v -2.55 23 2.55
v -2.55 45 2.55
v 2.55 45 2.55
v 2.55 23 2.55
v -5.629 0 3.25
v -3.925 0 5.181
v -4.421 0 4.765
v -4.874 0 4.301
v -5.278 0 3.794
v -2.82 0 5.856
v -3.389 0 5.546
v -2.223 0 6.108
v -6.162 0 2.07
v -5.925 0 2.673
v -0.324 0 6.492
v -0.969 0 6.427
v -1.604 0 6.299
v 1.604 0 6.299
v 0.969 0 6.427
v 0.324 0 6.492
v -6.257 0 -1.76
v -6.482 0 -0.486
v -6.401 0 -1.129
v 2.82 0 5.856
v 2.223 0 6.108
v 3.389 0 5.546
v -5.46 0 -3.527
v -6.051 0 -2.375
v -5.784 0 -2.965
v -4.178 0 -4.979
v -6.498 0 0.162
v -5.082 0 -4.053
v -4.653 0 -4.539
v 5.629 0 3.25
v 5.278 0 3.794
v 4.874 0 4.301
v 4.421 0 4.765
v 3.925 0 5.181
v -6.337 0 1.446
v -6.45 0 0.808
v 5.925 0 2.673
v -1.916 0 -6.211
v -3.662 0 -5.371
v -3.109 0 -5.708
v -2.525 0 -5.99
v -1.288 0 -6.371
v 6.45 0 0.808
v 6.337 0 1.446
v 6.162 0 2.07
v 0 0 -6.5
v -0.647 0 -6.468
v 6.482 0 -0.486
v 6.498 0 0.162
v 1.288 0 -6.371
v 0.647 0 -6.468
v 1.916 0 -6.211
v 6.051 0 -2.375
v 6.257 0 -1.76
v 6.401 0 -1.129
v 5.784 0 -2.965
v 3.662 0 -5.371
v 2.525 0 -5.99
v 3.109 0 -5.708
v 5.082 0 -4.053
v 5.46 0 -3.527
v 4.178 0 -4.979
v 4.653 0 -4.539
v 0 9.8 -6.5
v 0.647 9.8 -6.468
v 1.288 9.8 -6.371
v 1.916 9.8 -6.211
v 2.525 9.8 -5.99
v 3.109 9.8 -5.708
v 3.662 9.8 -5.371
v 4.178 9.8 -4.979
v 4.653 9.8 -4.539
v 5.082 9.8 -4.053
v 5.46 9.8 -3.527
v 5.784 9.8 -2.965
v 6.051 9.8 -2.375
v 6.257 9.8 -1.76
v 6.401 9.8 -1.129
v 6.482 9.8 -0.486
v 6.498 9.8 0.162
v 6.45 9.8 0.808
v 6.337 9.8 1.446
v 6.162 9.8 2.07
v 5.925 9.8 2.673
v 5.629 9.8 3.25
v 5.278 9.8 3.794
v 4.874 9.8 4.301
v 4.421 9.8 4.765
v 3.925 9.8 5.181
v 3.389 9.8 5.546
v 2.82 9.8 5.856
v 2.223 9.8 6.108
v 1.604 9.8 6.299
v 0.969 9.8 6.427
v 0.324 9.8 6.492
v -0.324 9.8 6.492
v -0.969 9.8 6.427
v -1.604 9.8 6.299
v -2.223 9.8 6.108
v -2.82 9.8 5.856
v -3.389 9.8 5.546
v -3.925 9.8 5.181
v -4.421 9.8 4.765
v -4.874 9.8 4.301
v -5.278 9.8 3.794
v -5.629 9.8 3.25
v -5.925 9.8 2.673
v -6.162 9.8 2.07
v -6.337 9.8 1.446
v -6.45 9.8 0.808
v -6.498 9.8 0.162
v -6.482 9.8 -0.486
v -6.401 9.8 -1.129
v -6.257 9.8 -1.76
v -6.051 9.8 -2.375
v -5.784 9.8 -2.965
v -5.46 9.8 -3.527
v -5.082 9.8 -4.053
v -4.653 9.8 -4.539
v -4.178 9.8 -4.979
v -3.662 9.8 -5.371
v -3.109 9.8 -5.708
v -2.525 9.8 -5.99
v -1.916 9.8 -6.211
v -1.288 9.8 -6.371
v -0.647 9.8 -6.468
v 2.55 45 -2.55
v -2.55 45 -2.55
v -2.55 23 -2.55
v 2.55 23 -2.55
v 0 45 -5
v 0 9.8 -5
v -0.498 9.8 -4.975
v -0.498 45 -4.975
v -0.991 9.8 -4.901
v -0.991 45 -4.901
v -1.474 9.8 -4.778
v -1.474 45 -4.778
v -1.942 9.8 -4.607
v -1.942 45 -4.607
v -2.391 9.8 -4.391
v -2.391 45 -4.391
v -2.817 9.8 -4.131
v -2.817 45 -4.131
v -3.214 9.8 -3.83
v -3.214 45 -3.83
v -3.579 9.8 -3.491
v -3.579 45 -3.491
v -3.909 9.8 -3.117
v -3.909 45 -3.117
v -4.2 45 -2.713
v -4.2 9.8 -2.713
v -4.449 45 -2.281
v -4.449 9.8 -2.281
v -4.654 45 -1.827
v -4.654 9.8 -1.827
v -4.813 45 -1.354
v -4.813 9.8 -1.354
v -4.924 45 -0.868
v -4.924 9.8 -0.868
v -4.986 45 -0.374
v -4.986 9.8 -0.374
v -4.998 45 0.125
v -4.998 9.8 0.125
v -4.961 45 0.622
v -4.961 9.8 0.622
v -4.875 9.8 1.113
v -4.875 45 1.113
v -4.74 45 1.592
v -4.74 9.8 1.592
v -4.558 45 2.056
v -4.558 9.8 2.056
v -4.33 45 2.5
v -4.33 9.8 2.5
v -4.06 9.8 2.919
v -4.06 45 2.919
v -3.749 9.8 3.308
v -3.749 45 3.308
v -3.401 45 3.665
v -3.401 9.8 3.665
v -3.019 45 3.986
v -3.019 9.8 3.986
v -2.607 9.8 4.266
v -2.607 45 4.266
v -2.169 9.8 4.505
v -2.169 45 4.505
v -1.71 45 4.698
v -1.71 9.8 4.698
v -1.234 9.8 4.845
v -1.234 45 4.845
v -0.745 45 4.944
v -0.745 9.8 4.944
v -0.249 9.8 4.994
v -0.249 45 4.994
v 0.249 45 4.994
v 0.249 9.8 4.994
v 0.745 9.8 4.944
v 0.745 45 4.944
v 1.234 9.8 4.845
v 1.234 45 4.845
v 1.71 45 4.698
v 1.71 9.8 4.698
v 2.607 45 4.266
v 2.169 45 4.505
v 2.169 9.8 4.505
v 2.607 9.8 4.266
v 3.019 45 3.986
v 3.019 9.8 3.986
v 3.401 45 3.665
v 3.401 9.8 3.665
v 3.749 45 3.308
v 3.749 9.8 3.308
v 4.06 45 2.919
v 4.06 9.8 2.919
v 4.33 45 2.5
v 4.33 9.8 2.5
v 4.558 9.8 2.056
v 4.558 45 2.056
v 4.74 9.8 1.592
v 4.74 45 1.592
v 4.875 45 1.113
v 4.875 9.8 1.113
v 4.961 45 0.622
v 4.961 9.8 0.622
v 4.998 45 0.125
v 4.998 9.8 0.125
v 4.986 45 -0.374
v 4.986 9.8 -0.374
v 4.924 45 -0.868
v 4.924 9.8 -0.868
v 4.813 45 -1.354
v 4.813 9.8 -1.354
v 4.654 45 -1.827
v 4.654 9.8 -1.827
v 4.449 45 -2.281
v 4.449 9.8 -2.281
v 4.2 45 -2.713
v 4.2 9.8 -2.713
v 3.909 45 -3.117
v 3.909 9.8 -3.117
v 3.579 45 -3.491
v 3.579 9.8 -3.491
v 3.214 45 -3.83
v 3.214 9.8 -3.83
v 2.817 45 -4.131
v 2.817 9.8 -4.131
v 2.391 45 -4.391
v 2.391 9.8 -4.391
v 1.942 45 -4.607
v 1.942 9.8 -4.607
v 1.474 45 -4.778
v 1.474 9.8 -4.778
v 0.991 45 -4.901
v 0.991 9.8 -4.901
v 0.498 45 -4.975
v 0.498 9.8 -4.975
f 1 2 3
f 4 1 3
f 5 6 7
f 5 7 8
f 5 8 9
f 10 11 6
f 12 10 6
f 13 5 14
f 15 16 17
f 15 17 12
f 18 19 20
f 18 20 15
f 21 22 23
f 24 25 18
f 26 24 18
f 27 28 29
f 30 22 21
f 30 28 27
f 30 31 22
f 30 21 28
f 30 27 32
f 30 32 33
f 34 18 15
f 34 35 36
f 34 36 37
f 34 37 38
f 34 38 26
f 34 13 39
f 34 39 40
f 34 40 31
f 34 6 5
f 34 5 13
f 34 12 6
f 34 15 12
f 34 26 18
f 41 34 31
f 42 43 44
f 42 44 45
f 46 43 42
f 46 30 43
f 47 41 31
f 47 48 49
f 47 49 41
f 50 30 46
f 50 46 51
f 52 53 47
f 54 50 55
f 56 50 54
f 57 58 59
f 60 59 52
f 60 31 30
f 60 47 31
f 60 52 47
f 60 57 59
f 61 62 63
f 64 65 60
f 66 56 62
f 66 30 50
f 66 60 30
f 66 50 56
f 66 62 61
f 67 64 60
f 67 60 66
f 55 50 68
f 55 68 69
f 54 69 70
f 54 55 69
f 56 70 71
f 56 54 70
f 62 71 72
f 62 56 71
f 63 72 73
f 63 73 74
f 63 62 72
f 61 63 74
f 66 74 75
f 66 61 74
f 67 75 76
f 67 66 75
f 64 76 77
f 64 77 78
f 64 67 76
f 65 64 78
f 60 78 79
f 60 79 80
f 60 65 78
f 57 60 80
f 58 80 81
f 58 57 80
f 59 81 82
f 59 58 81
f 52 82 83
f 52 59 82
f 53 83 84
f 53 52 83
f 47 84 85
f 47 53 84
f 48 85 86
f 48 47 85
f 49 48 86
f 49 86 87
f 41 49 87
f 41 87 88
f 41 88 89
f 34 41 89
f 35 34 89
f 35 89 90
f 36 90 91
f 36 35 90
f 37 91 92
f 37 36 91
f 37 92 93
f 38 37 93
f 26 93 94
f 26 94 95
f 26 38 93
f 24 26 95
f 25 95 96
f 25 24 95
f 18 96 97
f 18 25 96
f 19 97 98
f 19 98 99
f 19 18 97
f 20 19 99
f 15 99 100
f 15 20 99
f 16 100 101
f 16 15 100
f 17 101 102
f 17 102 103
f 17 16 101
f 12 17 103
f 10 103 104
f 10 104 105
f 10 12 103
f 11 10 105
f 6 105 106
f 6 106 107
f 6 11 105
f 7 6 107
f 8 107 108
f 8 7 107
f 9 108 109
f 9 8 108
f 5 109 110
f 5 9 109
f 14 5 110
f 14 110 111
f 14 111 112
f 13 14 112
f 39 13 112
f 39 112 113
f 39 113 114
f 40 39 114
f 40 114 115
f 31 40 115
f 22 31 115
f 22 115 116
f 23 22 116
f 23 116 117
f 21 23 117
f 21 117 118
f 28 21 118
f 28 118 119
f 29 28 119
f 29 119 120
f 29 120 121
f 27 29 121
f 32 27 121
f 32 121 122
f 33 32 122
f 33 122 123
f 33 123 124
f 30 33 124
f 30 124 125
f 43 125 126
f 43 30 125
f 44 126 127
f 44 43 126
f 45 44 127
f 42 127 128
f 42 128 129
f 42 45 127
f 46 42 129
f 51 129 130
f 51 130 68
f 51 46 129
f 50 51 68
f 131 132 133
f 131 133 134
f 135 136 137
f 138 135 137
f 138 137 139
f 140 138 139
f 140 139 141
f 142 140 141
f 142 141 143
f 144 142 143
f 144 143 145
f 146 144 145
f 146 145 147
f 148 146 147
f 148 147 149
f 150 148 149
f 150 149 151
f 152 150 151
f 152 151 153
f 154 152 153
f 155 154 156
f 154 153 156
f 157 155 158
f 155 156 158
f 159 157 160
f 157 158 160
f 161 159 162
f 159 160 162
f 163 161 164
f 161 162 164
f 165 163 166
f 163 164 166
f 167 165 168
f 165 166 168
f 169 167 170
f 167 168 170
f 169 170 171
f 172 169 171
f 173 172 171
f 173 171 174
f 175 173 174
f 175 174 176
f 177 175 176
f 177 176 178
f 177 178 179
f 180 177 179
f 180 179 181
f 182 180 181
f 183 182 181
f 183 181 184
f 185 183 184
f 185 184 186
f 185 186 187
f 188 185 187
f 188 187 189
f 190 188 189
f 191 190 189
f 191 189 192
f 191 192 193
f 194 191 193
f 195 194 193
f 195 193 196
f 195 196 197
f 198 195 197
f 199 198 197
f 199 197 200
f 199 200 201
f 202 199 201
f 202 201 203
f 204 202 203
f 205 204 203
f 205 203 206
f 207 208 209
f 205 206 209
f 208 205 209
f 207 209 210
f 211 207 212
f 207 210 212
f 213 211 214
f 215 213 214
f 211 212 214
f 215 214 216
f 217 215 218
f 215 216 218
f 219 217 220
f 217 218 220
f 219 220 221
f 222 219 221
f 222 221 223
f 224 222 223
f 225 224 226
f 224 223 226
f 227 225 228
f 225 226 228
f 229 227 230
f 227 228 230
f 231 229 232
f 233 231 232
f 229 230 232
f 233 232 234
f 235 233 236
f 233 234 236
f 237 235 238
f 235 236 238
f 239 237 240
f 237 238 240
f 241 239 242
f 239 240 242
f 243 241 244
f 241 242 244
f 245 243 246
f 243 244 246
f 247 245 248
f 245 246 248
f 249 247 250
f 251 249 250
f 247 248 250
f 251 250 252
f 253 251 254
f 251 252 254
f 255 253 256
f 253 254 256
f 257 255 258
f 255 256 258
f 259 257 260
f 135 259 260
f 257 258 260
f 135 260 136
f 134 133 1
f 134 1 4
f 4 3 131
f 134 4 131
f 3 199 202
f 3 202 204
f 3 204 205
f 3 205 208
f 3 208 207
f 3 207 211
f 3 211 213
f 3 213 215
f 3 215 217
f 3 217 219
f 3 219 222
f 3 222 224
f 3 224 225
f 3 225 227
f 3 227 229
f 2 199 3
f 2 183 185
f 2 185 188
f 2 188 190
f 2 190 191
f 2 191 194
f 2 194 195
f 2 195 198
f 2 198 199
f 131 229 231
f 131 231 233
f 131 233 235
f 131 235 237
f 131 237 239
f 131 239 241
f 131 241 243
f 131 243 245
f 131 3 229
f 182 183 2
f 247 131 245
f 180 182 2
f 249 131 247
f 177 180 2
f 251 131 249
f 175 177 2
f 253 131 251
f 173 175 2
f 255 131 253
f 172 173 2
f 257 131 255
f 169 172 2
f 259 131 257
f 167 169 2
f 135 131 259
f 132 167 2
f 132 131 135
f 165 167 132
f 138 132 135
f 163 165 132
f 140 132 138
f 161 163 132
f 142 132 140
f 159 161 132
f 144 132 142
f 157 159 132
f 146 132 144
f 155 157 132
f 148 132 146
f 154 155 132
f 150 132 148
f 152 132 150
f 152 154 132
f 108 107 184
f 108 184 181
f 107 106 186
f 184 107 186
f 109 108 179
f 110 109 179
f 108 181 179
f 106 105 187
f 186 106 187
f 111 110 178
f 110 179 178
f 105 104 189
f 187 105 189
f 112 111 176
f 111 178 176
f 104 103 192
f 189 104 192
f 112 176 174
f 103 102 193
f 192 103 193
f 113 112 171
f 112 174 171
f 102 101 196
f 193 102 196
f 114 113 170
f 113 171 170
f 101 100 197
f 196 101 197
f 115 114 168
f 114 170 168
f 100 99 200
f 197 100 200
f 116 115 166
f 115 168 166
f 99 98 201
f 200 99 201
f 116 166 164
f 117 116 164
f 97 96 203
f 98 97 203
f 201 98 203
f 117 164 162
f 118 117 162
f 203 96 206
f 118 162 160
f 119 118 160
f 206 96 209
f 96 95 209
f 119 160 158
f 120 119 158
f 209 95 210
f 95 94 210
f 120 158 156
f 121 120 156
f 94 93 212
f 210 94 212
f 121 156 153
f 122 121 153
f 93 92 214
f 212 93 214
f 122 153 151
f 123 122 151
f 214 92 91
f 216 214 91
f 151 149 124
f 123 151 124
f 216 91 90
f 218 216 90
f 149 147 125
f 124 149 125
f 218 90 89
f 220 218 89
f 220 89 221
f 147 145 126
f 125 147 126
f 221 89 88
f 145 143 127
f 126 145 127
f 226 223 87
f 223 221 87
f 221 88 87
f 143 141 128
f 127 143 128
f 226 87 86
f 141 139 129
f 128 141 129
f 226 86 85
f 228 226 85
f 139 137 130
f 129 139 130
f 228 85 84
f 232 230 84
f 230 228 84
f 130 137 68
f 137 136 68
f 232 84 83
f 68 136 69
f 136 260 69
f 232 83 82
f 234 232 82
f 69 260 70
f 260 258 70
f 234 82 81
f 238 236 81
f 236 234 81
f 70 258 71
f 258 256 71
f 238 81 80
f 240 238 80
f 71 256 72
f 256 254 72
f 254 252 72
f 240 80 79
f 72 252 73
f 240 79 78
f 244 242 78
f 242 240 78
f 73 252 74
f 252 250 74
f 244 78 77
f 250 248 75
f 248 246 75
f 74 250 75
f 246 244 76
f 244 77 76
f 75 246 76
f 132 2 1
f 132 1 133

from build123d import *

# Parameters (mm, degrees)
SKETCH1_R           = 5
BOSS_EXTRUDE1_DEPTH = 45
SKETCH2_W           = 5.1
SKETCH2_H           = 5.1
CUT_EXTRUDE1_DEPTH  = 22
SKETCH3_R           = 6.5
BOSS_EXTRUDE2_DEPTH = 9.8


with BuildPart() as part:
    # Sketch1 → Boss-Extrude1 (new body)
    with BuildSketch(Plane(origin=(0, 0, 0), x_dir=(1, 0, 0), z_dir=(0, 1, 0))):
        with Locations(Location((0, 0, 0), (0, 0, 90))):
            Circle(SKETCH1_R)
    extrude(amount=BOSS_EXTRUDE1_DEPTH)

    # Sketch2 → Cut-Extrude1 (cut)
    with BuildSketch(Plane(origin=(0, 45, 0), x_dir=(1, 0, 0), z_dir=(0, 1, 0))):
        Rectangle(SKETCH2_W, SKETCH2_H)
    extrude(amount=-CUT_EXTRUDE1_DEPTH, mode=Mode.SUBTRACT)

    # Sketch3 → Boss-Extrude2 (add)
    with BuildSketch(Plane.XZ):
        with Locations(Location((0, 0, 0), (0, 0, 270))):
            Circle(SKETCH3_R)
    extrude(amount=-BOSS_EXTRUDE2_DEPTH)


solid = part.part
